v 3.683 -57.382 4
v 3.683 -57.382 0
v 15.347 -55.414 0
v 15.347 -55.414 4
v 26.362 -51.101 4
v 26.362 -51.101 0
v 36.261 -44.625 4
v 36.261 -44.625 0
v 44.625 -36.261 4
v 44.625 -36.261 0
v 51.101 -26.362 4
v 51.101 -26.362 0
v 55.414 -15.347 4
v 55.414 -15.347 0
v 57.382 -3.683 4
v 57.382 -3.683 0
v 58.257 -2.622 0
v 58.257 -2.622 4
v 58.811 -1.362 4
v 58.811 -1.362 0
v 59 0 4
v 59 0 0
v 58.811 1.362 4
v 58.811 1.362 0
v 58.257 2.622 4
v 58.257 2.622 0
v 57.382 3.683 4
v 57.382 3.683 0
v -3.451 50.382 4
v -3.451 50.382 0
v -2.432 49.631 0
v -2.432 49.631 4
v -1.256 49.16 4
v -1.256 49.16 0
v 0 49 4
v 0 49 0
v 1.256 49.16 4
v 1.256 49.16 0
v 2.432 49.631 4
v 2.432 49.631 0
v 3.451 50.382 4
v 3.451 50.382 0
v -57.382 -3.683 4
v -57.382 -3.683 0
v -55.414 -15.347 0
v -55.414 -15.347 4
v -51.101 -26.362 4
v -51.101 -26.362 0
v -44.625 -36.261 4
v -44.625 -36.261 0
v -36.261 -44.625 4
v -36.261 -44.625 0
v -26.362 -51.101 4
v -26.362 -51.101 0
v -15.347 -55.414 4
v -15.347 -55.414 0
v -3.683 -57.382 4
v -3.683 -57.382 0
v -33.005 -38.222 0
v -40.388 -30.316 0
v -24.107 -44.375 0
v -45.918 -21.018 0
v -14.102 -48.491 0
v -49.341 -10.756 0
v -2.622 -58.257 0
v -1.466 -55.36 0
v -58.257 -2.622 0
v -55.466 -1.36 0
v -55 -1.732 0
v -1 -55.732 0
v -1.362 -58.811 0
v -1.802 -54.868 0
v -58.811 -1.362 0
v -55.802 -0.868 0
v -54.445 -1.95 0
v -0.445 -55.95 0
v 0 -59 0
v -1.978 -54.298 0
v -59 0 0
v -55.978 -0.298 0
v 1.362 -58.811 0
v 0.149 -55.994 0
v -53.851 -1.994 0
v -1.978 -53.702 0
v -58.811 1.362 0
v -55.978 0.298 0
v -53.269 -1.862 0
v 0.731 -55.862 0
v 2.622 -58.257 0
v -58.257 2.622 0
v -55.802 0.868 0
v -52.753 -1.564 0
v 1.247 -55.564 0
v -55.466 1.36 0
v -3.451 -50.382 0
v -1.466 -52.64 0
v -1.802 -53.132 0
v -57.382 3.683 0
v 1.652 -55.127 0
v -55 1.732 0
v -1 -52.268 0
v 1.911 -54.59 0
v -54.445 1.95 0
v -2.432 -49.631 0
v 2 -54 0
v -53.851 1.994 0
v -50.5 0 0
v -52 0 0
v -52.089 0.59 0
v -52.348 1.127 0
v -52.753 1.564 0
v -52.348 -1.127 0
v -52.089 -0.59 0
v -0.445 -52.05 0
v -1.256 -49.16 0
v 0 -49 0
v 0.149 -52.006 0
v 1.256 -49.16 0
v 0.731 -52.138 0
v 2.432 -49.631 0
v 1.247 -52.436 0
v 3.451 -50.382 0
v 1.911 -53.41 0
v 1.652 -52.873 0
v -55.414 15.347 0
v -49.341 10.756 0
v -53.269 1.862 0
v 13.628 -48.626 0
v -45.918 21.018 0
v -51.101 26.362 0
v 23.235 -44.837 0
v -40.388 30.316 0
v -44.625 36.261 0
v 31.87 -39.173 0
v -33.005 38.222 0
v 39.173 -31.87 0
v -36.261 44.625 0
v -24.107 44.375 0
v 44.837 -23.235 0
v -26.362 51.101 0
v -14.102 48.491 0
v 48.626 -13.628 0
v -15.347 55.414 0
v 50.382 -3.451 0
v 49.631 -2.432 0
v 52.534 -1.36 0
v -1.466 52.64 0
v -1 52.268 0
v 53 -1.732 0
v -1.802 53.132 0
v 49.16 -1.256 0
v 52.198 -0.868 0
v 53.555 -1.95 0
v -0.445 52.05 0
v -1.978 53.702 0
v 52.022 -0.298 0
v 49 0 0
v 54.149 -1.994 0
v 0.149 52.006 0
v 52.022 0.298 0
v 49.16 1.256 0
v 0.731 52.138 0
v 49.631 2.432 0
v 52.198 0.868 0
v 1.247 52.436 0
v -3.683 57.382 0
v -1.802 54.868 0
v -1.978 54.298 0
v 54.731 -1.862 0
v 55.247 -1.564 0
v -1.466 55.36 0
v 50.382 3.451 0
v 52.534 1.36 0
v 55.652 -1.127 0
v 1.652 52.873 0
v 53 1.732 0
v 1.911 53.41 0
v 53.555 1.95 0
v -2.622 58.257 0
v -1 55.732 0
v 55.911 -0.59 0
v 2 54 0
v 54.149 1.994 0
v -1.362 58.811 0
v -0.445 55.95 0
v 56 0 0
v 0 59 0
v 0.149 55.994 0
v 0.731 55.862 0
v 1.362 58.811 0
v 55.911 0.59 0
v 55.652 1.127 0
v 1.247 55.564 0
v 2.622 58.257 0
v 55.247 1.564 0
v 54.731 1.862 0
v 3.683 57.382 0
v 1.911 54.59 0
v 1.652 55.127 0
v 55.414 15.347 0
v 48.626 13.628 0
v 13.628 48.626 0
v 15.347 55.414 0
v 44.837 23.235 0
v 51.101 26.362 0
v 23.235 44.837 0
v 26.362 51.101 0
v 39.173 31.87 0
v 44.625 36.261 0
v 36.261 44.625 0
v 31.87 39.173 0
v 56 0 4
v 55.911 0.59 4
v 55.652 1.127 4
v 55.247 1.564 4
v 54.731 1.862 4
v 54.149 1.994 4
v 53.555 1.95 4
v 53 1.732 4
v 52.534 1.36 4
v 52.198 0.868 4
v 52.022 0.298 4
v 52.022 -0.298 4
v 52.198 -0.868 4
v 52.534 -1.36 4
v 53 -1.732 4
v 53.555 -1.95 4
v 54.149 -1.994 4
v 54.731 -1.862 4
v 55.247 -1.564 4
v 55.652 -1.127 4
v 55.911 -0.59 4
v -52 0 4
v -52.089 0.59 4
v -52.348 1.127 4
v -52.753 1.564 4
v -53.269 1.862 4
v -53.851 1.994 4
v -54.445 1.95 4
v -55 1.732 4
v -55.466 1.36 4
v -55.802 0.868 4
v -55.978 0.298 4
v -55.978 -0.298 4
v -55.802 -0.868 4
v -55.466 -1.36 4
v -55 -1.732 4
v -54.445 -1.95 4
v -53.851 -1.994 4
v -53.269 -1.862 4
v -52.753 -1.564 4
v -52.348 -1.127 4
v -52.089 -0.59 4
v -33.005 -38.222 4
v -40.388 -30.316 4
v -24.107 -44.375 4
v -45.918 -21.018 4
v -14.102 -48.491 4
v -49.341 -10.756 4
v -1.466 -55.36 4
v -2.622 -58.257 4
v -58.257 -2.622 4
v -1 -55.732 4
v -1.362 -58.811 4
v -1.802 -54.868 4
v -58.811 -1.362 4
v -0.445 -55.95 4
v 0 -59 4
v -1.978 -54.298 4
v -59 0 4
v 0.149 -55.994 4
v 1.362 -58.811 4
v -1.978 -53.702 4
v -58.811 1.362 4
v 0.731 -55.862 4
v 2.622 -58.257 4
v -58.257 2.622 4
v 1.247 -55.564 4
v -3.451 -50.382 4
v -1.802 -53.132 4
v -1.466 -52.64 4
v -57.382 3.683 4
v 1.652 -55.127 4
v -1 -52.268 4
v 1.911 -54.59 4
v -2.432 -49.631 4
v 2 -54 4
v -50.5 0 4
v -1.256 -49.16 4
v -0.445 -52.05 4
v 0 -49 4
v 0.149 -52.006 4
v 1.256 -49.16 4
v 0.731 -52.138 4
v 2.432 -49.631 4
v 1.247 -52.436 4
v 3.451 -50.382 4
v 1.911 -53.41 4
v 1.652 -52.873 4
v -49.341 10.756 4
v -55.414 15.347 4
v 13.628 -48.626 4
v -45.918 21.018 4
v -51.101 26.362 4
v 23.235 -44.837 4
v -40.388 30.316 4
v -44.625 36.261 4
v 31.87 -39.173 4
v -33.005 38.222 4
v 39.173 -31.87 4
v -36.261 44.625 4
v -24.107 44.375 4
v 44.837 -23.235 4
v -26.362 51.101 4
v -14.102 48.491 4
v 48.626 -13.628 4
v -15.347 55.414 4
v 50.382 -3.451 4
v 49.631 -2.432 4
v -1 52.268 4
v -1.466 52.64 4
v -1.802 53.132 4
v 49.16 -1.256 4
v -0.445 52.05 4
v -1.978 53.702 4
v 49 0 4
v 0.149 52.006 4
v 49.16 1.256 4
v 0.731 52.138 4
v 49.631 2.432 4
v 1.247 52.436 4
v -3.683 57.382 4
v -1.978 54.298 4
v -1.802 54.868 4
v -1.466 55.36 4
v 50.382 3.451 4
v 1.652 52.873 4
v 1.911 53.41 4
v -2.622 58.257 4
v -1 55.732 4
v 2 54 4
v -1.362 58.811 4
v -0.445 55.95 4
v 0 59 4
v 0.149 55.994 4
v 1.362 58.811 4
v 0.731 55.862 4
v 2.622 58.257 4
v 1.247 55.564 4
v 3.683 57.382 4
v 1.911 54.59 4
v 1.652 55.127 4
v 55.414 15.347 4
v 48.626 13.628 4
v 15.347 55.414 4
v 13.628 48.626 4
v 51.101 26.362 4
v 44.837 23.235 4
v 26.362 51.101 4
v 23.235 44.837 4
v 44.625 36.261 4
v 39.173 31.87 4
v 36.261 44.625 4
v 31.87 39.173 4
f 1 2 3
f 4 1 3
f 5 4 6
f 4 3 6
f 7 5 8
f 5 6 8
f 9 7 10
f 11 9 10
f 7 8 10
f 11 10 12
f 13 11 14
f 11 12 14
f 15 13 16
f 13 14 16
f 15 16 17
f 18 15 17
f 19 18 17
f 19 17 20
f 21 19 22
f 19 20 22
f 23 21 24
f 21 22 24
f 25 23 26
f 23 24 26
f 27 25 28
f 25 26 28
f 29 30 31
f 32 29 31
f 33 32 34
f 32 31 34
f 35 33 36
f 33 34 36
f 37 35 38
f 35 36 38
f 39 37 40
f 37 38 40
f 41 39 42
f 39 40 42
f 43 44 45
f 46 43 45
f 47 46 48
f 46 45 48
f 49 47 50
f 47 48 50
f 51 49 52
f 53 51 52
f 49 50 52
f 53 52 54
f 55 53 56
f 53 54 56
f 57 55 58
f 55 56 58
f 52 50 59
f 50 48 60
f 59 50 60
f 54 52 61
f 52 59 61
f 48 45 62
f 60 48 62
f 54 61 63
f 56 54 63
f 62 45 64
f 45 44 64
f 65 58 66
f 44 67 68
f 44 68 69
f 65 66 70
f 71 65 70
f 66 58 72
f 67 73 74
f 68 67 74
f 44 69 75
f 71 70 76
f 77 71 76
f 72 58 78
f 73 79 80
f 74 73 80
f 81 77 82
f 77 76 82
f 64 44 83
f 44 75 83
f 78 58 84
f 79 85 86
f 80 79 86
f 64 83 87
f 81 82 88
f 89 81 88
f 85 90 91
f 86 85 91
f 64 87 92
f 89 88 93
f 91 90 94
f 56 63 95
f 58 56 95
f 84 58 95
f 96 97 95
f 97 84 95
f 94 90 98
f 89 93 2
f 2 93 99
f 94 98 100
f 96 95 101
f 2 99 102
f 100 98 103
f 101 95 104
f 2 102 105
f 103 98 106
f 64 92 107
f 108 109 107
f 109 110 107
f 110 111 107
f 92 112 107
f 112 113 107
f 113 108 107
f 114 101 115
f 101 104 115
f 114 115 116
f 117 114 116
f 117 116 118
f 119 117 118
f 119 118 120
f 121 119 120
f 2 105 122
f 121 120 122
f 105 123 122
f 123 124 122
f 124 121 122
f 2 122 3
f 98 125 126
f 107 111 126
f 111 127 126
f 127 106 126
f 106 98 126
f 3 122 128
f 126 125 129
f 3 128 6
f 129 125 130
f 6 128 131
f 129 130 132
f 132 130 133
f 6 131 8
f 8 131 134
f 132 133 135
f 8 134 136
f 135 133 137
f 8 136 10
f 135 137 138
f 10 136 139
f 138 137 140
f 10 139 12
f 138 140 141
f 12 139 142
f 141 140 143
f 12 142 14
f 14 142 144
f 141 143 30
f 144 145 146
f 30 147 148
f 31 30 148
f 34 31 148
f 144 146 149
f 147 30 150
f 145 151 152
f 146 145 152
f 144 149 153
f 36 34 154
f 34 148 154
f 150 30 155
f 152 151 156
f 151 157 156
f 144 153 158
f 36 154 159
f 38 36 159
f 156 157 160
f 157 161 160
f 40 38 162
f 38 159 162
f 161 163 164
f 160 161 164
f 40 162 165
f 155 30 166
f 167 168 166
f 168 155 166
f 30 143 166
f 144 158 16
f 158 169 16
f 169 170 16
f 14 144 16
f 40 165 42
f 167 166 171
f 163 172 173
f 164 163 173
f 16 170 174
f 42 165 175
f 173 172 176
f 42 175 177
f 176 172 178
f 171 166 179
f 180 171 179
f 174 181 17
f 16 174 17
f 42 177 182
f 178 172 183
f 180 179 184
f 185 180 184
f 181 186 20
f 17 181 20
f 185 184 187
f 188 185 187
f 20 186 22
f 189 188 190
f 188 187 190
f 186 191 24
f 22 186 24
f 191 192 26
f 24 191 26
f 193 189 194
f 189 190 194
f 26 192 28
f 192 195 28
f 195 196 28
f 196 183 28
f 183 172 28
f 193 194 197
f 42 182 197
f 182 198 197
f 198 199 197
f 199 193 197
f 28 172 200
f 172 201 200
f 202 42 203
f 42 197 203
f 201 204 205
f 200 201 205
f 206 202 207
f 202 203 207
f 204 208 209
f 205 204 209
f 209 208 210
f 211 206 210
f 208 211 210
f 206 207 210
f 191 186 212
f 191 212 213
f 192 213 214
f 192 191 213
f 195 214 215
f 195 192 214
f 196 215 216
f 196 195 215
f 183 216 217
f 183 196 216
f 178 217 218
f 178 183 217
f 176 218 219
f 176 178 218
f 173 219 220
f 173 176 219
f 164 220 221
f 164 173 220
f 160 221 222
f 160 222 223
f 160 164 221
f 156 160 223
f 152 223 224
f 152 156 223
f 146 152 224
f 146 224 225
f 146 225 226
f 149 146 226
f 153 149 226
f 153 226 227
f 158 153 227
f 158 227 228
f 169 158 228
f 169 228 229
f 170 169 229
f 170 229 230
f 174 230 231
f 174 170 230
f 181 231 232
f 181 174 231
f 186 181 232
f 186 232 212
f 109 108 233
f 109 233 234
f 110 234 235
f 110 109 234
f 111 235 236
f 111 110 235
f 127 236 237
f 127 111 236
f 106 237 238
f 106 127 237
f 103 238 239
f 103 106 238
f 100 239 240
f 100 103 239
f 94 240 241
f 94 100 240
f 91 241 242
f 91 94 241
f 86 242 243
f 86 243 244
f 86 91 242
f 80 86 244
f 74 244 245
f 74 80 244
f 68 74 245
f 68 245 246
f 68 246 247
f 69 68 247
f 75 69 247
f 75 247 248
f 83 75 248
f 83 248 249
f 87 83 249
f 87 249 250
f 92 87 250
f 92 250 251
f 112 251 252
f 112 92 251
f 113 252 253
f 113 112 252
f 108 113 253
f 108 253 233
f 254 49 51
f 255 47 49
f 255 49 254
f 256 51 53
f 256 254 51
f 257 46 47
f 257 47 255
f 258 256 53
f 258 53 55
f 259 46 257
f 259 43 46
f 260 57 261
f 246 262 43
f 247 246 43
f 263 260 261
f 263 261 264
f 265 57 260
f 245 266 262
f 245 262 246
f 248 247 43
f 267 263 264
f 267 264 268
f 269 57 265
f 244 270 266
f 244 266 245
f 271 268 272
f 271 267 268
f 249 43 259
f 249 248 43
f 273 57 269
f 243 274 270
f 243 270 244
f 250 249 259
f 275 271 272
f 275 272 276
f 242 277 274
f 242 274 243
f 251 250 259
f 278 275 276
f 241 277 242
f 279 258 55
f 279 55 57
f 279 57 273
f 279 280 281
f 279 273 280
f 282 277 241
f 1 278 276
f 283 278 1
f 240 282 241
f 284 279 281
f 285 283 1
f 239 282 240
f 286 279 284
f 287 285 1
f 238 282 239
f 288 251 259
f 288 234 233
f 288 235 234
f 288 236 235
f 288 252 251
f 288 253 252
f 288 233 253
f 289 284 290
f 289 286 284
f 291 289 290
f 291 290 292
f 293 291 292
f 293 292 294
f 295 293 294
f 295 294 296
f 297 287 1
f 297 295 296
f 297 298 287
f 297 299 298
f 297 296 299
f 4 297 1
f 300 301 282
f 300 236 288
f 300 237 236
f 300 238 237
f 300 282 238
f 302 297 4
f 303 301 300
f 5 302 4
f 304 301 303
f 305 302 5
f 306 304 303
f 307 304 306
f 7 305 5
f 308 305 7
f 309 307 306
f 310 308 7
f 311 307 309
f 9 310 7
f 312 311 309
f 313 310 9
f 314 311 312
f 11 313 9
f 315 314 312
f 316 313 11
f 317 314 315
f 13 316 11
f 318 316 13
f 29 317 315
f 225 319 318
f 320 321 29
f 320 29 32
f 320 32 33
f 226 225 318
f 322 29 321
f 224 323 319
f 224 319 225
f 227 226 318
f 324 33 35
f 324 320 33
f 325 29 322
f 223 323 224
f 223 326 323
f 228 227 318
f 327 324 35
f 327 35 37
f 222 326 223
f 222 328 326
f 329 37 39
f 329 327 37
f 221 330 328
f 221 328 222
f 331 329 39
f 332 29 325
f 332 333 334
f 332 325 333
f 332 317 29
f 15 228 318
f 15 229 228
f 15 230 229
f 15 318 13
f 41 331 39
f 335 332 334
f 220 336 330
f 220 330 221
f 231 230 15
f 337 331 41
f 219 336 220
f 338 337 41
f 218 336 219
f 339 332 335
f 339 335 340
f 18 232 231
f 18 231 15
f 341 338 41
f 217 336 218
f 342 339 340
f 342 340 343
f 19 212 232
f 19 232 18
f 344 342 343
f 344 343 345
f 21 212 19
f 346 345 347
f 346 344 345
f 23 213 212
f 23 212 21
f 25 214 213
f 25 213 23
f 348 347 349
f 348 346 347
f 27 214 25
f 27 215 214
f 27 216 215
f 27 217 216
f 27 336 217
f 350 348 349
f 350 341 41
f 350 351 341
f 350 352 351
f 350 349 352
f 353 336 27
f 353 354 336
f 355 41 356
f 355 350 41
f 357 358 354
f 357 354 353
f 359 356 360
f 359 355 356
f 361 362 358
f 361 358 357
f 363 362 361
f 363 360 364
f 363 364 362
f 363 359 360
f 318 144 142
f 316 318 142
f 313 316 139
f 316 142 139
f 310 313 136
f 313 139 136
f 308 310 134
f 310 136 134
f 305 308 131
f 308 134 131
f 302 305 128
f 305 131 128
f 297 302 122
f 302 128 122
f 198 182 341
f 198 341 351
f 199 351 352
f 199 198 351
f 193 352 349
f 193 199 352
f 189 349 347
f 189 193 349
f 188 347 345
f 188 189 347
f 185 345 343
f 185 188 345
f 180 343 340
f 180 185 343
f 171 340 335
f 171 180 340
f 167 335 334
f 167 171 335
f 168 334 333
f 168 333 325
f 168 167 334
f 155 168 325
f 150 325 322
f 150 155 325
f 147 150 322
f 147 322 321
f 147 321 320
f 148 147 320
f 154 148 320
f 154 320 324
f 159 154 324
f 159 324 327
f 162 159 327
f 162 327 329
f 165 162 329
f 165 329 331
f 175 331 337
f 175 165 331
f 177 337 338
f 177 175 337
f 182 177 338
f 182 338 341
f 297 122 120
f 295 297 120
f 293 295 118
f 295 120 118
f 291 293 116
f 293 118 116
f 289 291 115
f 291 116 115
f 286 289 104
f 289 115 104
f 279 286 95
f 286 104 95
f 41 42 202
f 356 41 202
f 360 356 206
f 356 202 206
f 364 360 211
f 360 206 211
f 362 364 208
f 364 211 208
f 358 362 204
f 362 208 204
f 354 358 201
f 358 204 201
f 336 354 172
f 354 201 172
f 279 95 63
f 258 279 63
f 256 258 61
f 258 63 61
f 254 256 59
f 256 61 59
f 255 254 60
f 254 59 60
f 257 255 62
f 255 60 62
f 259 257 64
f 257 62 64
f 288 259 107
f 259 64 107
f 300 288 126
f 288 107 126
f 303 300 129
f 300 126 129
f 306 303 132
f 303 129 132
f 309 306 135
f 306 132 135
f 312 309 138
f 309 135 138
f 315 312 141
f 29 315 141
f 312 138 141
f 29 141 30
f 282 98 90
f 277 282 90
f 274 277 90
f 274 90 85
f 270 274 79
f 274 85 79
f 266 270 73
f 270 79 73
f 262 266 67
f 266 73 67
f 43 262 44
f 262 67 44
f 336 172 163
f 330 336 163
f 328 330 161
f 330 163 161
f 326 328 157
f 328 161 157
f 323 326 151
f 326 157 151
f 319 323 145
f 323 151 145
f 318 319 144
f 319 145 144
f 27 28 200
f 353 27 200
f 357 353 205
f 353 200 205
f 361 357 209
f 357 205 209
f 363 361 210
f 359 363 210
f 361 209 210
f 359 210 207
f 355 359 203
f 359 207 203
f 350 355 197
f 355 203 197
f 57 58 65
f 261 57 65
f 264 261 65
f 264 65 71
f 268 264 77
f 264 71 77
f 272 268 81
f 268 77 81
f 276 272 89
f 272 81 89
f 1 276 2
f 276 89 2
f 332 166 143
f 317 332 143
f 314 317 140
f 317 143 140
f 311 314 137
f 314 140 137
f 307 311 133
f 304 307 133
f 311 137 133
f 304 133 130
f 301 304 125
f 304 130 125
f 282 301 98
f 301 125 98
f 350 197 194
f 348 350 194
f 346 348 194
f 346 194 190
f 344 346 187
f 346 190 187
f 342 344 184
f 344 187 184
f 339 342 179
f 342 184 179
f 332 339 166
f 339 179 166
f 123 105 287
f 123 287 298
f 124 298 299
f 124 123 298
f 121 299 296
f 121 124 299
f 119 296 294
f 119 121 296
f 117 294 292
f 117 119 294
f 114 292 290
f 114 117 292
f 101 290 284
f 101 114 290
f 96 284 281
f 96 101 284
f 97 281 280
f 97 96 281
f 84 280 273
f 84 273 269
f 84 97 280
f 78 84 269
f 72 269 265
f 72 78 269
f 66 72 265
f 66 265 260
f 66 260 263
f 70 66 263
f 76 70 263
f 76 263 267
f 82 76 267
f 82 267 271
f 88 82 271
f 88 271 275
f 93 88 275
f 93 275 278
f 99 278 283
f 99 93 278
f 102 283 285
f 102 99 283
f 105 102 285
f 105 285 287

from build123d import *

# Parameters (mm, degrees)
CROQUIS1_R              = 2
SALIENTE_EXTRUIR1_DEPTH = 4


with BuildPart() as part:
    # Croquis1 → Saliente-Extruir1 (new body)
    with BuildSketch(Plane.XY):
        with BuildLine():
            ThreePointArc((57.381944444, -3.682723418), (59, 0), (57.381944444, 3.682723418))
            ThreePointArc((57.381944444, 3.682723418), (40.658639918, 40.658639918), (3.682723418, 57.381944444))
            ThreePointArc((3.682723418, 57.381944444), (0, 59), (-3.682723418, 57.381944444))
            ThreePointArc((-3.682723418, 57.381944444), (-40.658639918, 40.658639918), (-57.381944444, 3.682723418))
            ThreePointArc((-57.381944444, 3.682723418), (-59, 0), (-57.381944444, -3.682723418))
            ThreePointArc((-57.381944444, -3.682723418), (-40.658639918, -40.658639918), (-3.682723418, -57.381944444))
            ThreePointArc((-3.682723418, -57.381944444), (0, -59), (3.682723418, -57.381944444))
            ThreePointArc((3.682723418, -57.381944444), (40.658639918, -40.658639918), (57.381944444, -3.682723418))
        make_face()
        with BuildLine():
            ThreePointArc((-3.451039553, 50.381944444), (0, 49), (3.451039553, 50.381944444))
            ThreePointArc((3.451039553, 50.381944444), (35.70889245, 35.70889245), (50.381944444, 3.451039553))
            ThreePointArc((50.381944444, 3.451039553), (49, 0), (50.381944444, -3.451039553))
            ThreePointArc((50.381944444, -3.451039553), (35.70889245, -35.70889245), (3.451039553, -50.381944444))
            ThreePointArc((3.451039553, -50.381944444), (0, -49), (-3.451039553, -50.381944444))
            ThreePointArc((-3.451039553, -50.381944444), (-50.5, 0), (-3.451039553, 50.381944444))
        make_face(mode=Mode.SUBTRACT)
        with Locations((54, 0)):
            Circle(CROQUIS1_R, mode=Mode.SUBTRACT)
        with Locations((0, 54)):
            Circle(CROQUIS1_R, mode=Mode.SUBTRACT)
        with Locations((0, -54)):
            Circle(CROQUIS1_R, mode=Mode.SUBTRACT)
        with Locations((-54, 0)):
            Circle(CROQUIS1_R, mode=Mode.SUBTRACT)
    extrude(amount=SALIENTE_EXTRUIR1_DEPTH)


solid = part.part
